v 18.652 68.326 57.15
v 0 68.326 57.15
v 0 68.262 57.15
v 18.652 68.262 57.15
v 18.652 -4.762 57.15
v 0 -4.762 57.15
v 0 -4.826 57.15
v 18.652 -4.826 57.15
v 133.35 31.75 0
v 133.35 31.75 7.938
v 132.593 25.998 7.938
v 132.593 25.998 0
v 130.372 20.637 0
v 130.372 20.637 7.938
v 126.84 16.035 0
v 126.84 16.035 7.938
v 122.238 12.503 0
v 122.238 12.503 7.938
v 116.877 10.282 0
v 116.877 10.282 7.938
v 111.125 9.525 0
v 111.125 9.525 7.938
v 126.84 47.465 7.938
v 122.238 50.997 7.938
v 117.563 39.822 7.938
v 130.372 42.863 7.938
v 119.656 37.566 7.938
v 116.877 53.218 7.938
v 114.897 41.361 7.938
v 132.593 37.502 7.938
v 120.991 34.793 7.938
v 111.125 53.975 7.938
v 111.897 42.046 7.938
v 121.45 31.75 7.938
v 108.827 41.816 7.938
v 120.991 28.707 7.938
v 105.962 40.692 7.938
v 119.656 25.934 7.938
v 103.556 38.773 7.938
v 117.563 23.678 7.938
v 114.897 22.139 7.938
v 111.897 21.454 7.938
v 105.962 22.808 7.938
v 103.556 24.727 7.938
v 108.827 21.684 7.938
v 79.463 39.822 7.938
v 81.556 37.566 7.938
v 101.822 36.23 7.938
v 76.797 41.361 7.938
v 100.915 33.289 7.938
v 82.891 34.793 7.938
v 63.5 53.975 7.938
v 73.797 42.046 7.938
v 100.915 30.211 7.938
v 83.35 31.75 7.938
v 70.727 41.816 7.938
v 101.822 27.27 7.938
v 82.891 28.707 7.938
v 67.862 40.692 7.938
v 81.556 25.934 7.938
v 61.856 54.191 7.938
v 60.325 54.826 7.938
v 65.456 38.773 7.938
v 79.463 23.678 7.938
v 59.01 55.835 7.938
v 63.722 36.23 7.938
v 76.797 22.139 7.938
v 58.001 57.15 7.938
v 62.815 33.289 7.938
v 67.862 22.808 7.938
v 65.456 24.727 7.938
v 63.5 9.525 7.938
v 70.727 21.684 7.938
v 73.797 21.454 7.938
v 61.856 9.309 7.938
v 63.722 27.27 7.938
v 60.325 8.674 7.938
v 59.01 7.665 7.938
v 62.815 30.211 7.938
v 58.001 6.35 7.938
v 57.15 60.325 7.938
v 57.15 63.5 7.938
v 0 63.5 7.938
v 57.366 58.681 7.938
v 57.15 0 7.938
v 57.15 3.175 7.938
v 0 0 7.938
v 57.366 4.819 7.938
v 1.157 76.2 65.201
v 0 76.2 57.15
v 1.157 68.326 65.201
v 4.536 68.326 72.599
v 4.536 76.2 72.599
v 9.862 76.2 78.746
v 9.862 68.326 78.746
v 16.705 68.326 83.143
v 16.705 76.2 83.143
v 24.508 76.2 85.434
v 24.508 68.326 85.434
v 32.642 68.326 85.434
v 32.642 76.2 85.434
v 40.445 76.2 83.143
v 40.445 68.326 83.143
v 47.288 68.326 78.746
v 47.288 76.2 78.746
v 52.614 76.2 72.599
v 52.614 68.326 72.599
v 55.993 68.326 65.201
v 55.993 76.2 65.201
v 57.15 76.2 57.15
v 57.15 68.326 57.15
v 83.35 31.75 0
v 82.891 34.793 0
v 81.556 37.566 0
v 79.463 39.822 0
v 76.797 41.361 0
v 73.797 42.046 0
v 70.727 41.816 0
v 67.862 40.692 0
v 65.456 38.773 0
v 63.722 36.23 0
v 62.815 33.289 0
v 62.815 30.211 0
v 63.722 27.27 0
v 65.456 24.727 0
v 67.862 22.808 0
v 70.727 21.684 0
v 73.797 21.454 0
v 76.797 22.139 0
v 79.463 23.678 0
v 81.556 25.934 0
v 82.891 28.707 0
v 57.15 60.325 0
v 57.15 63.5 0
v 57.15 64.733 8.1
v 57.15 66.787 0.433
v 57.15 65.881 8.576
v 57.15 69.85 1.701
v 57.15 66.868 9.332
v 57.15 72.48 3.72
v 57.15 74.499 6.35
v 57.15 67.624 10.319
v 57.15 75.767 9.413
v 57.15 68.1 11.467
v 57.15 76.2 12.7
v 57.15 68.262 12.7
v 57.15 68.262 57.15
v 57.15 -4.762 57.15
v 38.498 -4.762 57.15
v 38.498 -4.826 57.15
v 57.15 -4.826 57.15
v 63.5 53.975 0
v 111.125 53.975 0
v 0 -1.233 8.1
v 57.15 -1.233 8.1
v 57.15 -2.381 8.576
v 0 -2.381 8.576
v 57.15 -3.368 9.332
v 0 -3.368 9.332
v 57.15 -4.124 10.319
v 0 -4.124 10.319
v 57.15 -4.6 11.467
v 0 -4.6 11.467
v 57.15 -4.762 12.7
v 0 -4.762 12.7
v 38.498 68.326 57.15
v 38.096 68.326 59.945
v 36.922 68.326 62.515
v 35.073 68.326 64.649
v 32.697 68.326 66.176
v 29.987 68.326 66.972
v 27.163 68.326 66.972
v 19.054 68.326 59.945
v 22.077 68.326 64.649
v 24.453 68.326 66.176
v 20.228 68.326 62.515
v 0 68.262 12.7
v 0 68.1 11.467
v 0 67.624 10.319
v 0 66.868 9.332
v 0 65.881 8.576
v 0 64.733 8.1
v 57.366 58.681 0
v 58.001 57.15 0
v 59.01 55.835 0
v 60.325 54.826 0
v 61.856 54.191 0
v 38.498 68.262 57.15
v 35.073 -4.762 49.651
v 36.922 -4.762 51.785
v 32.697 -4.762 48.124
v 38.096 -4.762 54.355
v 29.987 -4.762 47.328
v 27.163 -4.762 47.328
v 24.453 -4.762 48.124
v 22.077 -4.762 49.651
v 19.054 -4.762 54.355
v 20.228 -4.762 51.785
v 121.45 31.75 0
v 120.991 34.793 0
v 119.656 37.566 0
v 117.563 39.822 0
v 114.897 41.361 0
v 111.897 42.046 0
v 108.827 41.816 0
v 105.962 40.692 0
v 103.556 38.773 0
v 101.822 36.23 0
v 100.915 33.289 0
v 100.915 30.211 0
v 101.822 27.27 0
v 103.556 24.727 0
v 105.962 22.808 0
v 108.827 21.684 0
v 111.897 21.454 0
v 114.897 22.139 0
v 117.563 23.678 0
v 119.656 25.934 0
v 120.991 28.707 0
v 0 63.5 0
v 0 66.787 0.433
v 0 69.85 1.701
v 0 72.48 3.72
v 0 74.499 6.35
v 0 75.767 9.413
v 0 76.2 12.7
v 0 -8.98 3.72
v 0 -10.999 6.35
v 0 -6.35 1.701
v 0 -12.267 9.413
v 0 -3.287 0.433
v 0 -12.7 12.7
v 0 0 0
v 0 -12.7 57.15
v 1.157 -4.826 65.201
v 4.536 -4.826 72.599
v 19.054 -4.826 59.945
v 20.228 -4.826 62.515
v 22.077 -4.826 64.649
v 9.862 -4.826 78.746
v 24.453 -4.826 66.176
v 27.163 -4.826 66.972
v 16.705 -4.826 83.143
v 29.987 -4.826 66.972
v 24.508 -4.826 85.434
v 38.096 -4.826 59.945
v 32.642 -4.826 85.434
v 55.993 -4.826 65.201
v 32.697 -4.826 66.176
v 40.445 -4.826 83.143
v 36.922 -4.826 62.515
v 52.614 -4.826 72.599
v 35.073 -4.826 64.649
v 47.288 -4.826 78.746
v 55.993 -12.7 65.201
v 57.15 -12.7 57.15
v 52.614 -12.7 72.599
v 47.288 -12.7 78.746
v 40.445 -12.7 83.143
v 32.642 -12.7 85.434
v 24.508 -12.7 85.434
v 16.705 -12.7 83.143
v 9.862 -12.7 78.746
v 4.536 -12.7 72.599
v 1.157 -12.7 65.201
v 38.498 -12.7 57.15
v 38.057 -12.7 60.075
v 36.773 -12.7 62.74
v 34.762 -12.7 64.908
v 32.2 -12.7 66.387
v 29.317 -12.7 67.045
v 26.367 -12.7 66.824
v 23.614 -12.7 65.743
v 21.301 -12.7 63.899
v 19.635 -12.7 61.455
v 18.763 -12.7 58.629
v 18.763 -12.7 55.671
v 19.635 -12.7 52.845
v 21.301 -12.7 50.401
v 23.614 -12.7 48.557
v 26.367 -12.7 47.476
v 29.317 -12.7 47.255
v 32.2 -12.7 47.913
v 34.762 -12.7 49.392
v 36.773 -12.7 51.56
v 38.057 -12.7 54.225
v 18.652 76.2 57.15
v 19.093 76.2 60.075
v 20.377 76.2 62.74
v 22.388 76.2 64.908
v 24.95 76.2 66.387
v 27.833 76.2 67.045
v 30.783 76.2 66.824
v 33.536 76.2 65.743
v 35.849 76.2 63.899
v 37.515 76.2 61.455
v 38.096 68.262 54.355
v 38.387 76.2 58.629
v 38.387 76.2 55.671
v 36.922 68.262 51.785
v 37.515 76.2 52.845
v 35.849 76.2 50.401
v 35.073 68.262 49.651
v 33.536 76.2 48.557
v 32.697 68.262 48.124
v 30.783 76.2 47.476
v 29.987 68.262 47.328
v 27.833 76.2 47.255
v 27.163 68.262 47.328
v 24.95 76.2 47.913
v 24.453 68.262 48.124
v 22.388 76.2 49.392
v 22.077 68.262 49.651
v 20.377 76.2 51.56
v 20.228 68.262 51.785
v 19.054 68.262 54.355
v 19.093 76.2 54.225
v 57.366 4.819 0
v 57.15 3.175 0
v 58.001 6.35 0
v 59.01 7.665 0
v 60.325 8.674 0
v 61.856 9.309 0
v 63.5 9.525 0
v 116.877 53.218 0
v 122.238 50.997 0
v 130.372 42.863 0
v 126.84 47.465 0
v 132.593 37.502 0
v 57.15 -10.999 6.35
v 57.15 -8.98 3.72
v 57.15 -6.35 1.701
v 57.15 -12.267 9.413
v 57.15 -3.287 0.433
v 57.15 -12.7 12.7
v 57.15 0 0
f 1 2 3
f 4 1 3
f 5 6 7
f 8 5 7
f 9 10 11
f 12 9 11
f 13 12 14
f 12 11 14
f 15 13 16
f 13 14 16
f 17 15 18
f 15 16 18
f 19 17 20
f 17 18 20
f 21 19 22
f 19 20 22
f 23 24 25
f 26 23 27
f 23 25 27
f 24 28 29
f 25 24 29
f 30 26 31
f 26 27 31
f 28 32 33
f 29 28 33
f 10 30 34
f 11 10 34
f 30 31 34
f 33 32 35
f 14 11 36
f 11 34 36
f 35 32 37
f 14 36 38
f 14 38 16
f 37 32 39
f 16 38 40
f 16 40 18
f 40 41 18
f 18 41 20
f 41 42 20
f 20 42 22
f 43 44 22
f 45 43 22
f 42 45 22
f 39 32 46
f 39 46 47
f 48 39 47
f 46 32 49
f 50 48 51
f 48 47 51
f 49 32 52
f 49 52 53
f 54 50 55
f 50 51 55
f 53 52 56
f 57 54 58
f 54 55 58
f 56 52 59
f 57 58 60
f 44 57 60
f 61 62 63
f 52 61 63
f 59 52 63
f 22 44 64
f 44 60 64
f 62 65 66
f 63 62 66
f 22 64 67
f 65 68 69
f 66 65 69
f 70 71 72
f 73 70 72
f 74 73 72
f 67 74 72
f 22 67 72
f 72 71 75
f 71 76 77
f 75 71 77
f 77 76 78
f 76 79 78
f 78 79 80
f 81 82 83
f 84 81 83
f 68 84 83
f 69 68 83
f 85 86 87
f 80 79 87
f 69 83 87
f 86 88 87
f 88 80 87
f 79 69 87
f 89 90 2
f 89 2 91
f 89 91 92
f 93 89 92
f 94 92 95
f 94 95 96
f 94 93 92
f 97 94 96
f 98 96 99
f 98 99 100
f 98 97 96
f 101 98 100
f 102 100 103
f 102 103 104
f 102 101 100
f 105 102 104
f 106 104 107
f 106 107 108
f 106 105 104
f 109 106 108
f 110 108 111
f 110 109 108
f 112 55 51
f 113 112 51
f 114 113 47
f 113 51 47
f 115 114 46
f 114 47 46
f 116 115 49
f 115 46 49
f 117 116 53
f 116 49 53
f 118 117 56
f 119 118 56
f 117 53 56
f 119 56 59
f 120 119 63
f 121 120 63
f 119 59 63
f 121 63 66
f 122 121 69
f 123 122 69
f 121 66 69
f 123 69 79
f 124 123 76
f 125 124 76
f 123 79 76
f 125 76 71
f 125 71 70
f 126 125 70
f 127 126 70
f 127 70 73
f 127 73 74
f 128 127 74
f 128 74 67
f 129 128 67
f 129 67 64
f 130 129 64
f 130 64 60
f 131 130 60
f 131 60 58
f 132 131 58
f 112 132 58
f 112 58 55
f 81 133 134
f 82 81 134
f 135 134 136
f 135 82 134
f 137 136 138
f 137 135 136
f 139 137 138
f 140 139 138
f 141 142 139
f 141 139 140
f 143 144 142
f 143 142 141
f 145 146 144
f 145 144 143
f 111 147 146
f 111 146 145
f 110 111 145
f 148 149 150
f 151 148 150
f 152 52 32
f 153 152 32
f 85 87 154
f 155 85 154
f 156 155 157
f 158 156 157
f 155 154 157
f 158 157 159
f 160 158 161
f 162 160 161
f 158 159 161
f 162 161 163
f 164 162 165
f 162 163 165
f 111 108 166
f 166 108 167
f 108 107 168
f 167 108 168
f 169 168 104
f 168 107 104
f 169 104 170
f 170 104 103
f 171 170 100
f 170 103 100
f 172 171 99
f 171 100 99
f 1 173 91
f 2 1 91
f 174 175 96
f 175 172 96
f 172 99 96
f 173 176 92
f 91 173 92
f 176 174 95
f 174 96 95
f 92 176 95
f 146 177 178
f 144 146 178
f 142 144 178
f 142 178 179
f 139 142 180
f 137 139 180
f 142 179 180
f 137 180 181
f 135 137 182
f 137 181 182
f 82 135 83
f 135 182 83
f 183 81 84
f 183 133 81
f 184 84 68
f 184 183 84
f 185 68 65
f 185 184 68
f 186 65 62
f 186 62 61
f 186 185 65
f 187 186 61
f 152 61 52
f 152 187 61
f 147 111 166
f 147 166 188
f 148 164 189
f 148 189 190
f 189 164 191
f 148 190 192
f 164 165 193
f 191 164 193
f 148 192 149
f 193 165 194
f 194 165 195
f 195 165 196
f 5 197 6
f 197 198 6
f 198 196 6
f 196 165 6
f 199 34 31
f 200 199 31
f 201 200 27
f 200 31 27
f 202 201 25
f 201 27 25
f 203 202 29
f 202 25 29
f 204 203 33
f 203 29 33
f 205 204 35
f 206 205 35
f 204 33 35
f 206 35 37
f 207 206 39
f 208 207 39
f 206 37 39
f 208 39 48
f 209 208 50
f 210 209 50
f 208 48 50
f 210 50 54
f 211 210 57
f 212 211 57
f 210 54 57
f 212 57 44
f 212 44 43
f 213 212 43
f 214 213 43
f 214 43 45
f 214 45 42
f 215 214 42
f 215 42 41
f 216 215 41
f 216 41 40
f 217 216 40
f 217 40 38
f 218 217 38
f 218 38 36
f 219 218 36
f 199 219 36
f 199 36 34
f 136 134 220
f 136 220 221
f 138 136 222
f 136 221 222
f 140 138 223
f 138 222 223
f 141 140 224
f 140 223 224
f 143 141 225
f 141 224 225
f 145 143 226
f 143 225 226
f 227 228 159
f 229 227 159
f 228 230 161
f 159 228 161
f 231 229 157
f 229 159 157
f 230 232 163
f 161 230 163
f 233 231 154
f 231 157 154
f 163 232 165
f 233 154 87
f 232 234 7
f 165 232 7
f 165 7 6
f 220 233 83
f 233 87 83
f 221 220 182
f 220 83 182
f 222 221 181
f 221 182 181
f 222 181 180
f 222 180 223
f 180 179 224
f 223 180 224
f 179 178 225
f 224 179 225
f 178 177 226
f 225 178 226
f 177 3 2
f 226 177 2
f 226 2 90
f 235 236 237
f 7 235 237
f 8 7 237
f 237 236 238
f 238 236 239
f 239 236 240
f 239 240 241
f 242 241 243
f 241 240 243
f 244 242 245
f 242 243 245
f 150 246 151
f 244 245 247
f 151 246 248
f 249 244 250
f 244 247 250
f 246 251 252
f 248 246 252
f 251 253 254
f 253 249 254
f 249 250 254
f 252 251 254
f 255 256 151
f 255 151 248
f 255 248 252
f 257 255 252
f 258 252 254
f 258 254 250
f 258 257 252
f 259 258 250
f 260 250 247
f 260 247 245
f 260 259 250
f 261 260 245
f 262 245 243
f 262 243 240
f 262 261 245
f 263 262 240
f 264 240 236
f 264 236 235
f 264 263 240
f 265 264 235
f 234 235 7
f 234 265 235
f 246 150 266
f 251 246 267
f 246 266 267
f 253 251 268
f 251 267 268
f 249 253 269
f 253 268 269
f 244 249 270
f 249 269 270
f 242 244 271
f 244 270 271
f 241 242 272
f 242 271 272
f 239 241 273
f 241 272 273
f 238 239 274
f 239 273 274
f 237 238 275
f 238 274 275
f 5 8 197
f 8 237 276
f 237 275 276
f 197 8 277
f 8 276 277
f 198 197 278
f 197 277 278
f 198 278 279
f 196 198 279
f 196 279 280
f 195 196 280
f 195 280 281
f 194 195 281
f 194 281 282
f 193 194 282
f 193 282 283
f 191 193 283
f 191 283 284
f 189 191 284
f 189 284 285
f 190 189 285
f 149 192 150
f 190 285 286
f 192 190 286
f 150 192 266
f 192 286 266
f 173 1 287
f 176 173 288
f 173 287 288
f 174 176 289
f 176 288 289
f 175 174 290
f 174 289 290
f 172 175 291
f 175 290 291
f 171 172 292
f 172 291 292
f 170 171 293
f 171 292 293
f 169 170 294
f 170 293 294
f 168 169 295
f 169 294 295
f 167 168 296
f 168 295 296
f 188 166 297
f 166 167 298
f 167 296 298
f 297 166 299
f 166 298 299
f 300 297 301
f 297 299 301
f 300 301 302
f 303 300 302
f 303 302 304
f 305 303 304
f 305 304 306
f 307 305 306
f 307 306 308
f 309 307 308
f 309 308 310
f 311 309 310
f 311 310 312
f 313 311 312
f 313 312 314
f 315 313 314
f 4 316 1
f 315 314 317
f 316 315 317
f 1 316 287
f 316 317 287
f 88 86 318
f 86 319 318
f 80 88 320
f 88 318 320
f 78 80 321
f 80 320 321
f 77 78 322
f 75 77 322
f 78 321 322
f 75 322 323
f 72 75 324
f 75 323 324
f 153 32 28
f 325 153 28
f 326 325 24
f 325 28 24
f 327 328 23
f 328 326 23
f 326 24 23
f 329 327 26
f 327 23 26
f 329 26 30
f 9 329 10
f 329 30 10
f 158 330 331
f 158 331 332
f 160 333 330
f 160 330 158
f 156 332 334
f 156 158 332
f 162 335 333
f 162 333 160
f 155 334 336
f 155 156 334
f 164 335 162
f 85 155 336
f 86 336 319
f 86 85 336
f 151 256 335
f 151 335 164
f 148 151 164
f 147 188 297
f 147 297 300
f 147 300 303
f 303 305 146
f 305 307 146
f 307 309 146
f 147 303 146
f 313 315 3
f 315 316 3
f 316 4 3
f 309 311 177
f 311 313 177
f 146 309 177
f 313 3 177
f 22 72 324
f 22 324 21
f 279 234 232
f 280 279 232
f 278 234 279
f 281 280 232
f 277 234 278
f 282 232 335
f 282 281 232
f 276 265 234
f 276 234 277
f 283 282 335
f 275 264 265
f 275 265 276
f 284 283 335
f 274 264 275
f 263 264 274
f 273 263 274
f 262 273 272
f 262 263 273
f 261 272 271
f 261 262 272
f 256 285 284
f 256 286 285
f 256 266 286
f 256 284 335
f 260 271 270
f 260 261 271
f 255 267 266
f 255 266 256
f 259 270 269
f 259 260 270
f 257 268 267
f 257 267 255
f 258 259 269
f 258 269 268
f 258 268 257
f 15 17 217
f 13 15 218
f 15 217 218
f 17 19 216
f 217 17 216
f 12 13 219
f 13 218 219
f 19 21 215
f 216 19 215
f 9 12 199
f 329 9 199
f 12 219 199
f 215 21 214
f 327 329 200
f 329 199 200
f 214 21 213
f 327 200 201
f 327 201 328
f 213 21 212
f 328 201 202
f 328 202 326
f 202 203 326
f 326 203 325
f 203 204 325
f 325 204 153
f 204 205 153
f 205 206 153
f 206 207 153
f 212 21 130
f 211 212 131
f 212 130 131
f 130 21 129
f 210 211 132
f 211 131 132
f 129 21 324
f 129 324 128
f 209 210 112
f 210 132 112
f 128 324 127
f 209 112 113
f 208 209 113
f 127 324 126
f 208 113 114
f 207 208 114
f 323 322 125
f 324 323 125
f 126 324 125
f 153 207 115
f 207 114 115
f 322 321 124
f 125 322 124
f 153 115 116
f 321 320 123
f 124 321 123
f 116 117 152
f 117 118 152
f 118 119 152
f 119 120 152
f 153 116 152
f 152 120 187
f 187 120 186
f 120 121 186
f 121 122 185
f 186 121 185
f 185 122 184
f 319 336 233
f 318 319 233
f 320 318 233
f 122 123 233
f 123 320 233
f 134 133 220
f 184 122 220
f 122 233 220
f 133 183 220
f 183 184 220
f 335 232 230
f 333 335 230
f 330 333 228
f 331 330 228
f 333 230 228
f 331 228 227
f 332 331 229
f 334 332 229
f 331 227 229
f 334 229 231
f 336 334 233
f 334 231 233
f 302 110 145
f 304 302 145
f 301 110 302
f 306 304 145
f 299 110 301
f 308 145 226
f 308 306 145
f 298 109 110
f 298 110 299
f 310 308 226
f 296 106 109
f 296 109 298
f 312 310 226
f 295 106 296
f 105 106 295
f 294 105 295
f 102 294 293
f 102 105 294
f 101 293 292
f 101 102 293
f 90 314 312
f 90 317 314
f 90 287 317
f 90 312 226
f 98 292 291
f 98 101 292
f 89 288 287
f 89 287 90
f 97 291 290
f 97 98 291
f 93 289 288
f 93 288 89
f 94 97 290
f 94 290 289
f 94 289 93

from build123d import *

# Parameters (mm, degrees)
F1_DEPTH  = 57.15
F3_DEPTH  = 7.874
F5_DEPTH  = 7.874
F6_R      = 9.92251
F7_DEPTH  = 25.4
F8_R      = 9.92251
F9_DEPTH  = 25.4
F10_W     = 76.2
F10_H     = 44.45
F11_DEPTH = 7.9375
F12_R     = 10.3251
F13_DEPTH = 25.4
F14_R     = 6.35


with BuildPart() as f1:
    # F0 (on Right) → F1 (new body)
    with BuildSketch(Plane.YZ):
        with BuildLine():
            ThreePointArc((-12.7, 12.7), (-8.9802561211, 3.7197438789), (0, 0))
            Line((0, 0), (63.5, 0))
            ThreePointArc((63.5, 0), (72.4802561211, 3.7197438789), (76.2, 12.7))
            Line((76.2, 12.7), (76.2, 57.15))
            Line((76.2, 57.15), (68.2625, 57.15))
            Line((68.2625, 57.15), (68.2625, 12.7))
            ThreePointArc((68.2625, 12.7), (66.8675960454, 9.3324039546), (63.5, 7.9375))
            Line((63.5, 7.9375), (0, 7.9375))
            ThreePointArc((0, 7.9375), (-3.3675960454, 9.3324039546), (-4.7625, 12.7))
            Line((-4.7625, 12.7), (-4.7625, 57.15))
            Line((-4.7625, 57.15), (-12.7, 57.15))
            Line((-12.7, 57.15), (-12.7, 12.7))
        make_face()
    extrude(amount=F1_DEPTH)

    # F2 (on face) → F3 (join)
    with BuildSketch(Plane.XZ.offset(12.7)):
        with BuildLine():
            Line((0, 57.15), (57.15, 57.15))
            ThreePointArc((57.15, 57.15), (28.575, 85.725), (0, 57.15))
        make_face()
    extrude(amount=-F3_DEPTH)

    # F4 (on face) → F5 (join)
    with BuildSketch(Plane(origin=(0, 76.2, 0), x_dir=(-1, 0, 0), z_dir=(0, 1, 0))):
        with BuildLine():
            Line((-57.15, 57.15), (0, 57.15))
            ThreePointArc((0, 57.15), (-28.575, 85.725), (-57.15, 57.15))
        make_face()
    extrude(amount=-F5_DEPTH)

    # F6 (on face) → F7 (cut)
    with BuildSketch(Plane.XZ.offset(12.7)):
        with Locations((28.575, 57.15)):
            Circle(F6_R)
    extrude(amount=-F7_DEPTH, mode=Mode.SUBTRACT)

    # F8 (on face) → F9 (cut)
    with BuildSketch(Plane(origin=(0, 76.2, 0), x_dir=(-1, 0, 0), z_dir=(0, 1, 0))):
        with Locations((-28.575, 57.15)):
            Circle(F8_R)
    extrude(amount=-F9_DEPTH, mode=Mode.SUBTRACT)

    # F10 (on face) → F11 (join)
    with BuildSketch(Plane.XY.offset(7.9375)):
        with Locations((95.25, 31.75)):
            Rectangle(F10_W, F10_H)
    extrude(amount=-F11_DEPTH)

    # F12 (on face) → F13 (cut)
    with BuildSketch(Plane.XY.offset(7.9375)):
        with Locations((73.025, 31.75)):
            Circle(F12_R)
        with Locations((111.125, 31.75)):
            Circle(F12_R)
        with BuildLine():
            ThreePointArc((111.125, 53.975), (126.8404482119, 47.4654482119), (133.35, 31.75))
            Line((133.35, 31.75), (133.35, 53.975))
            Line((133.35, 53.975), (111.125, 53.975))
        make_face()
        with BuildLine():
            Line((133.35, 9.525), (133.35, 31.75))
            ThreePointArc((133.35, 31.75), (126.8404482119, 16.0345517881), (111.125, 9.525))
            Line((111.125, 9.525), (133.35, 9.525))
        make_face()
    extrude(amount=-F13_DEPTH, mode=Mode.SUBTRACT)

    # F14
    f14_edges = [f1.edges().sort_by_distance(p)[0] for p in [
        (57.15, 9.525, 3.96875),
        (57.15, 53.975, 3.96875),
    ]]
    fillet(f14_edges, radius=F14_R)


solid = f1.part
